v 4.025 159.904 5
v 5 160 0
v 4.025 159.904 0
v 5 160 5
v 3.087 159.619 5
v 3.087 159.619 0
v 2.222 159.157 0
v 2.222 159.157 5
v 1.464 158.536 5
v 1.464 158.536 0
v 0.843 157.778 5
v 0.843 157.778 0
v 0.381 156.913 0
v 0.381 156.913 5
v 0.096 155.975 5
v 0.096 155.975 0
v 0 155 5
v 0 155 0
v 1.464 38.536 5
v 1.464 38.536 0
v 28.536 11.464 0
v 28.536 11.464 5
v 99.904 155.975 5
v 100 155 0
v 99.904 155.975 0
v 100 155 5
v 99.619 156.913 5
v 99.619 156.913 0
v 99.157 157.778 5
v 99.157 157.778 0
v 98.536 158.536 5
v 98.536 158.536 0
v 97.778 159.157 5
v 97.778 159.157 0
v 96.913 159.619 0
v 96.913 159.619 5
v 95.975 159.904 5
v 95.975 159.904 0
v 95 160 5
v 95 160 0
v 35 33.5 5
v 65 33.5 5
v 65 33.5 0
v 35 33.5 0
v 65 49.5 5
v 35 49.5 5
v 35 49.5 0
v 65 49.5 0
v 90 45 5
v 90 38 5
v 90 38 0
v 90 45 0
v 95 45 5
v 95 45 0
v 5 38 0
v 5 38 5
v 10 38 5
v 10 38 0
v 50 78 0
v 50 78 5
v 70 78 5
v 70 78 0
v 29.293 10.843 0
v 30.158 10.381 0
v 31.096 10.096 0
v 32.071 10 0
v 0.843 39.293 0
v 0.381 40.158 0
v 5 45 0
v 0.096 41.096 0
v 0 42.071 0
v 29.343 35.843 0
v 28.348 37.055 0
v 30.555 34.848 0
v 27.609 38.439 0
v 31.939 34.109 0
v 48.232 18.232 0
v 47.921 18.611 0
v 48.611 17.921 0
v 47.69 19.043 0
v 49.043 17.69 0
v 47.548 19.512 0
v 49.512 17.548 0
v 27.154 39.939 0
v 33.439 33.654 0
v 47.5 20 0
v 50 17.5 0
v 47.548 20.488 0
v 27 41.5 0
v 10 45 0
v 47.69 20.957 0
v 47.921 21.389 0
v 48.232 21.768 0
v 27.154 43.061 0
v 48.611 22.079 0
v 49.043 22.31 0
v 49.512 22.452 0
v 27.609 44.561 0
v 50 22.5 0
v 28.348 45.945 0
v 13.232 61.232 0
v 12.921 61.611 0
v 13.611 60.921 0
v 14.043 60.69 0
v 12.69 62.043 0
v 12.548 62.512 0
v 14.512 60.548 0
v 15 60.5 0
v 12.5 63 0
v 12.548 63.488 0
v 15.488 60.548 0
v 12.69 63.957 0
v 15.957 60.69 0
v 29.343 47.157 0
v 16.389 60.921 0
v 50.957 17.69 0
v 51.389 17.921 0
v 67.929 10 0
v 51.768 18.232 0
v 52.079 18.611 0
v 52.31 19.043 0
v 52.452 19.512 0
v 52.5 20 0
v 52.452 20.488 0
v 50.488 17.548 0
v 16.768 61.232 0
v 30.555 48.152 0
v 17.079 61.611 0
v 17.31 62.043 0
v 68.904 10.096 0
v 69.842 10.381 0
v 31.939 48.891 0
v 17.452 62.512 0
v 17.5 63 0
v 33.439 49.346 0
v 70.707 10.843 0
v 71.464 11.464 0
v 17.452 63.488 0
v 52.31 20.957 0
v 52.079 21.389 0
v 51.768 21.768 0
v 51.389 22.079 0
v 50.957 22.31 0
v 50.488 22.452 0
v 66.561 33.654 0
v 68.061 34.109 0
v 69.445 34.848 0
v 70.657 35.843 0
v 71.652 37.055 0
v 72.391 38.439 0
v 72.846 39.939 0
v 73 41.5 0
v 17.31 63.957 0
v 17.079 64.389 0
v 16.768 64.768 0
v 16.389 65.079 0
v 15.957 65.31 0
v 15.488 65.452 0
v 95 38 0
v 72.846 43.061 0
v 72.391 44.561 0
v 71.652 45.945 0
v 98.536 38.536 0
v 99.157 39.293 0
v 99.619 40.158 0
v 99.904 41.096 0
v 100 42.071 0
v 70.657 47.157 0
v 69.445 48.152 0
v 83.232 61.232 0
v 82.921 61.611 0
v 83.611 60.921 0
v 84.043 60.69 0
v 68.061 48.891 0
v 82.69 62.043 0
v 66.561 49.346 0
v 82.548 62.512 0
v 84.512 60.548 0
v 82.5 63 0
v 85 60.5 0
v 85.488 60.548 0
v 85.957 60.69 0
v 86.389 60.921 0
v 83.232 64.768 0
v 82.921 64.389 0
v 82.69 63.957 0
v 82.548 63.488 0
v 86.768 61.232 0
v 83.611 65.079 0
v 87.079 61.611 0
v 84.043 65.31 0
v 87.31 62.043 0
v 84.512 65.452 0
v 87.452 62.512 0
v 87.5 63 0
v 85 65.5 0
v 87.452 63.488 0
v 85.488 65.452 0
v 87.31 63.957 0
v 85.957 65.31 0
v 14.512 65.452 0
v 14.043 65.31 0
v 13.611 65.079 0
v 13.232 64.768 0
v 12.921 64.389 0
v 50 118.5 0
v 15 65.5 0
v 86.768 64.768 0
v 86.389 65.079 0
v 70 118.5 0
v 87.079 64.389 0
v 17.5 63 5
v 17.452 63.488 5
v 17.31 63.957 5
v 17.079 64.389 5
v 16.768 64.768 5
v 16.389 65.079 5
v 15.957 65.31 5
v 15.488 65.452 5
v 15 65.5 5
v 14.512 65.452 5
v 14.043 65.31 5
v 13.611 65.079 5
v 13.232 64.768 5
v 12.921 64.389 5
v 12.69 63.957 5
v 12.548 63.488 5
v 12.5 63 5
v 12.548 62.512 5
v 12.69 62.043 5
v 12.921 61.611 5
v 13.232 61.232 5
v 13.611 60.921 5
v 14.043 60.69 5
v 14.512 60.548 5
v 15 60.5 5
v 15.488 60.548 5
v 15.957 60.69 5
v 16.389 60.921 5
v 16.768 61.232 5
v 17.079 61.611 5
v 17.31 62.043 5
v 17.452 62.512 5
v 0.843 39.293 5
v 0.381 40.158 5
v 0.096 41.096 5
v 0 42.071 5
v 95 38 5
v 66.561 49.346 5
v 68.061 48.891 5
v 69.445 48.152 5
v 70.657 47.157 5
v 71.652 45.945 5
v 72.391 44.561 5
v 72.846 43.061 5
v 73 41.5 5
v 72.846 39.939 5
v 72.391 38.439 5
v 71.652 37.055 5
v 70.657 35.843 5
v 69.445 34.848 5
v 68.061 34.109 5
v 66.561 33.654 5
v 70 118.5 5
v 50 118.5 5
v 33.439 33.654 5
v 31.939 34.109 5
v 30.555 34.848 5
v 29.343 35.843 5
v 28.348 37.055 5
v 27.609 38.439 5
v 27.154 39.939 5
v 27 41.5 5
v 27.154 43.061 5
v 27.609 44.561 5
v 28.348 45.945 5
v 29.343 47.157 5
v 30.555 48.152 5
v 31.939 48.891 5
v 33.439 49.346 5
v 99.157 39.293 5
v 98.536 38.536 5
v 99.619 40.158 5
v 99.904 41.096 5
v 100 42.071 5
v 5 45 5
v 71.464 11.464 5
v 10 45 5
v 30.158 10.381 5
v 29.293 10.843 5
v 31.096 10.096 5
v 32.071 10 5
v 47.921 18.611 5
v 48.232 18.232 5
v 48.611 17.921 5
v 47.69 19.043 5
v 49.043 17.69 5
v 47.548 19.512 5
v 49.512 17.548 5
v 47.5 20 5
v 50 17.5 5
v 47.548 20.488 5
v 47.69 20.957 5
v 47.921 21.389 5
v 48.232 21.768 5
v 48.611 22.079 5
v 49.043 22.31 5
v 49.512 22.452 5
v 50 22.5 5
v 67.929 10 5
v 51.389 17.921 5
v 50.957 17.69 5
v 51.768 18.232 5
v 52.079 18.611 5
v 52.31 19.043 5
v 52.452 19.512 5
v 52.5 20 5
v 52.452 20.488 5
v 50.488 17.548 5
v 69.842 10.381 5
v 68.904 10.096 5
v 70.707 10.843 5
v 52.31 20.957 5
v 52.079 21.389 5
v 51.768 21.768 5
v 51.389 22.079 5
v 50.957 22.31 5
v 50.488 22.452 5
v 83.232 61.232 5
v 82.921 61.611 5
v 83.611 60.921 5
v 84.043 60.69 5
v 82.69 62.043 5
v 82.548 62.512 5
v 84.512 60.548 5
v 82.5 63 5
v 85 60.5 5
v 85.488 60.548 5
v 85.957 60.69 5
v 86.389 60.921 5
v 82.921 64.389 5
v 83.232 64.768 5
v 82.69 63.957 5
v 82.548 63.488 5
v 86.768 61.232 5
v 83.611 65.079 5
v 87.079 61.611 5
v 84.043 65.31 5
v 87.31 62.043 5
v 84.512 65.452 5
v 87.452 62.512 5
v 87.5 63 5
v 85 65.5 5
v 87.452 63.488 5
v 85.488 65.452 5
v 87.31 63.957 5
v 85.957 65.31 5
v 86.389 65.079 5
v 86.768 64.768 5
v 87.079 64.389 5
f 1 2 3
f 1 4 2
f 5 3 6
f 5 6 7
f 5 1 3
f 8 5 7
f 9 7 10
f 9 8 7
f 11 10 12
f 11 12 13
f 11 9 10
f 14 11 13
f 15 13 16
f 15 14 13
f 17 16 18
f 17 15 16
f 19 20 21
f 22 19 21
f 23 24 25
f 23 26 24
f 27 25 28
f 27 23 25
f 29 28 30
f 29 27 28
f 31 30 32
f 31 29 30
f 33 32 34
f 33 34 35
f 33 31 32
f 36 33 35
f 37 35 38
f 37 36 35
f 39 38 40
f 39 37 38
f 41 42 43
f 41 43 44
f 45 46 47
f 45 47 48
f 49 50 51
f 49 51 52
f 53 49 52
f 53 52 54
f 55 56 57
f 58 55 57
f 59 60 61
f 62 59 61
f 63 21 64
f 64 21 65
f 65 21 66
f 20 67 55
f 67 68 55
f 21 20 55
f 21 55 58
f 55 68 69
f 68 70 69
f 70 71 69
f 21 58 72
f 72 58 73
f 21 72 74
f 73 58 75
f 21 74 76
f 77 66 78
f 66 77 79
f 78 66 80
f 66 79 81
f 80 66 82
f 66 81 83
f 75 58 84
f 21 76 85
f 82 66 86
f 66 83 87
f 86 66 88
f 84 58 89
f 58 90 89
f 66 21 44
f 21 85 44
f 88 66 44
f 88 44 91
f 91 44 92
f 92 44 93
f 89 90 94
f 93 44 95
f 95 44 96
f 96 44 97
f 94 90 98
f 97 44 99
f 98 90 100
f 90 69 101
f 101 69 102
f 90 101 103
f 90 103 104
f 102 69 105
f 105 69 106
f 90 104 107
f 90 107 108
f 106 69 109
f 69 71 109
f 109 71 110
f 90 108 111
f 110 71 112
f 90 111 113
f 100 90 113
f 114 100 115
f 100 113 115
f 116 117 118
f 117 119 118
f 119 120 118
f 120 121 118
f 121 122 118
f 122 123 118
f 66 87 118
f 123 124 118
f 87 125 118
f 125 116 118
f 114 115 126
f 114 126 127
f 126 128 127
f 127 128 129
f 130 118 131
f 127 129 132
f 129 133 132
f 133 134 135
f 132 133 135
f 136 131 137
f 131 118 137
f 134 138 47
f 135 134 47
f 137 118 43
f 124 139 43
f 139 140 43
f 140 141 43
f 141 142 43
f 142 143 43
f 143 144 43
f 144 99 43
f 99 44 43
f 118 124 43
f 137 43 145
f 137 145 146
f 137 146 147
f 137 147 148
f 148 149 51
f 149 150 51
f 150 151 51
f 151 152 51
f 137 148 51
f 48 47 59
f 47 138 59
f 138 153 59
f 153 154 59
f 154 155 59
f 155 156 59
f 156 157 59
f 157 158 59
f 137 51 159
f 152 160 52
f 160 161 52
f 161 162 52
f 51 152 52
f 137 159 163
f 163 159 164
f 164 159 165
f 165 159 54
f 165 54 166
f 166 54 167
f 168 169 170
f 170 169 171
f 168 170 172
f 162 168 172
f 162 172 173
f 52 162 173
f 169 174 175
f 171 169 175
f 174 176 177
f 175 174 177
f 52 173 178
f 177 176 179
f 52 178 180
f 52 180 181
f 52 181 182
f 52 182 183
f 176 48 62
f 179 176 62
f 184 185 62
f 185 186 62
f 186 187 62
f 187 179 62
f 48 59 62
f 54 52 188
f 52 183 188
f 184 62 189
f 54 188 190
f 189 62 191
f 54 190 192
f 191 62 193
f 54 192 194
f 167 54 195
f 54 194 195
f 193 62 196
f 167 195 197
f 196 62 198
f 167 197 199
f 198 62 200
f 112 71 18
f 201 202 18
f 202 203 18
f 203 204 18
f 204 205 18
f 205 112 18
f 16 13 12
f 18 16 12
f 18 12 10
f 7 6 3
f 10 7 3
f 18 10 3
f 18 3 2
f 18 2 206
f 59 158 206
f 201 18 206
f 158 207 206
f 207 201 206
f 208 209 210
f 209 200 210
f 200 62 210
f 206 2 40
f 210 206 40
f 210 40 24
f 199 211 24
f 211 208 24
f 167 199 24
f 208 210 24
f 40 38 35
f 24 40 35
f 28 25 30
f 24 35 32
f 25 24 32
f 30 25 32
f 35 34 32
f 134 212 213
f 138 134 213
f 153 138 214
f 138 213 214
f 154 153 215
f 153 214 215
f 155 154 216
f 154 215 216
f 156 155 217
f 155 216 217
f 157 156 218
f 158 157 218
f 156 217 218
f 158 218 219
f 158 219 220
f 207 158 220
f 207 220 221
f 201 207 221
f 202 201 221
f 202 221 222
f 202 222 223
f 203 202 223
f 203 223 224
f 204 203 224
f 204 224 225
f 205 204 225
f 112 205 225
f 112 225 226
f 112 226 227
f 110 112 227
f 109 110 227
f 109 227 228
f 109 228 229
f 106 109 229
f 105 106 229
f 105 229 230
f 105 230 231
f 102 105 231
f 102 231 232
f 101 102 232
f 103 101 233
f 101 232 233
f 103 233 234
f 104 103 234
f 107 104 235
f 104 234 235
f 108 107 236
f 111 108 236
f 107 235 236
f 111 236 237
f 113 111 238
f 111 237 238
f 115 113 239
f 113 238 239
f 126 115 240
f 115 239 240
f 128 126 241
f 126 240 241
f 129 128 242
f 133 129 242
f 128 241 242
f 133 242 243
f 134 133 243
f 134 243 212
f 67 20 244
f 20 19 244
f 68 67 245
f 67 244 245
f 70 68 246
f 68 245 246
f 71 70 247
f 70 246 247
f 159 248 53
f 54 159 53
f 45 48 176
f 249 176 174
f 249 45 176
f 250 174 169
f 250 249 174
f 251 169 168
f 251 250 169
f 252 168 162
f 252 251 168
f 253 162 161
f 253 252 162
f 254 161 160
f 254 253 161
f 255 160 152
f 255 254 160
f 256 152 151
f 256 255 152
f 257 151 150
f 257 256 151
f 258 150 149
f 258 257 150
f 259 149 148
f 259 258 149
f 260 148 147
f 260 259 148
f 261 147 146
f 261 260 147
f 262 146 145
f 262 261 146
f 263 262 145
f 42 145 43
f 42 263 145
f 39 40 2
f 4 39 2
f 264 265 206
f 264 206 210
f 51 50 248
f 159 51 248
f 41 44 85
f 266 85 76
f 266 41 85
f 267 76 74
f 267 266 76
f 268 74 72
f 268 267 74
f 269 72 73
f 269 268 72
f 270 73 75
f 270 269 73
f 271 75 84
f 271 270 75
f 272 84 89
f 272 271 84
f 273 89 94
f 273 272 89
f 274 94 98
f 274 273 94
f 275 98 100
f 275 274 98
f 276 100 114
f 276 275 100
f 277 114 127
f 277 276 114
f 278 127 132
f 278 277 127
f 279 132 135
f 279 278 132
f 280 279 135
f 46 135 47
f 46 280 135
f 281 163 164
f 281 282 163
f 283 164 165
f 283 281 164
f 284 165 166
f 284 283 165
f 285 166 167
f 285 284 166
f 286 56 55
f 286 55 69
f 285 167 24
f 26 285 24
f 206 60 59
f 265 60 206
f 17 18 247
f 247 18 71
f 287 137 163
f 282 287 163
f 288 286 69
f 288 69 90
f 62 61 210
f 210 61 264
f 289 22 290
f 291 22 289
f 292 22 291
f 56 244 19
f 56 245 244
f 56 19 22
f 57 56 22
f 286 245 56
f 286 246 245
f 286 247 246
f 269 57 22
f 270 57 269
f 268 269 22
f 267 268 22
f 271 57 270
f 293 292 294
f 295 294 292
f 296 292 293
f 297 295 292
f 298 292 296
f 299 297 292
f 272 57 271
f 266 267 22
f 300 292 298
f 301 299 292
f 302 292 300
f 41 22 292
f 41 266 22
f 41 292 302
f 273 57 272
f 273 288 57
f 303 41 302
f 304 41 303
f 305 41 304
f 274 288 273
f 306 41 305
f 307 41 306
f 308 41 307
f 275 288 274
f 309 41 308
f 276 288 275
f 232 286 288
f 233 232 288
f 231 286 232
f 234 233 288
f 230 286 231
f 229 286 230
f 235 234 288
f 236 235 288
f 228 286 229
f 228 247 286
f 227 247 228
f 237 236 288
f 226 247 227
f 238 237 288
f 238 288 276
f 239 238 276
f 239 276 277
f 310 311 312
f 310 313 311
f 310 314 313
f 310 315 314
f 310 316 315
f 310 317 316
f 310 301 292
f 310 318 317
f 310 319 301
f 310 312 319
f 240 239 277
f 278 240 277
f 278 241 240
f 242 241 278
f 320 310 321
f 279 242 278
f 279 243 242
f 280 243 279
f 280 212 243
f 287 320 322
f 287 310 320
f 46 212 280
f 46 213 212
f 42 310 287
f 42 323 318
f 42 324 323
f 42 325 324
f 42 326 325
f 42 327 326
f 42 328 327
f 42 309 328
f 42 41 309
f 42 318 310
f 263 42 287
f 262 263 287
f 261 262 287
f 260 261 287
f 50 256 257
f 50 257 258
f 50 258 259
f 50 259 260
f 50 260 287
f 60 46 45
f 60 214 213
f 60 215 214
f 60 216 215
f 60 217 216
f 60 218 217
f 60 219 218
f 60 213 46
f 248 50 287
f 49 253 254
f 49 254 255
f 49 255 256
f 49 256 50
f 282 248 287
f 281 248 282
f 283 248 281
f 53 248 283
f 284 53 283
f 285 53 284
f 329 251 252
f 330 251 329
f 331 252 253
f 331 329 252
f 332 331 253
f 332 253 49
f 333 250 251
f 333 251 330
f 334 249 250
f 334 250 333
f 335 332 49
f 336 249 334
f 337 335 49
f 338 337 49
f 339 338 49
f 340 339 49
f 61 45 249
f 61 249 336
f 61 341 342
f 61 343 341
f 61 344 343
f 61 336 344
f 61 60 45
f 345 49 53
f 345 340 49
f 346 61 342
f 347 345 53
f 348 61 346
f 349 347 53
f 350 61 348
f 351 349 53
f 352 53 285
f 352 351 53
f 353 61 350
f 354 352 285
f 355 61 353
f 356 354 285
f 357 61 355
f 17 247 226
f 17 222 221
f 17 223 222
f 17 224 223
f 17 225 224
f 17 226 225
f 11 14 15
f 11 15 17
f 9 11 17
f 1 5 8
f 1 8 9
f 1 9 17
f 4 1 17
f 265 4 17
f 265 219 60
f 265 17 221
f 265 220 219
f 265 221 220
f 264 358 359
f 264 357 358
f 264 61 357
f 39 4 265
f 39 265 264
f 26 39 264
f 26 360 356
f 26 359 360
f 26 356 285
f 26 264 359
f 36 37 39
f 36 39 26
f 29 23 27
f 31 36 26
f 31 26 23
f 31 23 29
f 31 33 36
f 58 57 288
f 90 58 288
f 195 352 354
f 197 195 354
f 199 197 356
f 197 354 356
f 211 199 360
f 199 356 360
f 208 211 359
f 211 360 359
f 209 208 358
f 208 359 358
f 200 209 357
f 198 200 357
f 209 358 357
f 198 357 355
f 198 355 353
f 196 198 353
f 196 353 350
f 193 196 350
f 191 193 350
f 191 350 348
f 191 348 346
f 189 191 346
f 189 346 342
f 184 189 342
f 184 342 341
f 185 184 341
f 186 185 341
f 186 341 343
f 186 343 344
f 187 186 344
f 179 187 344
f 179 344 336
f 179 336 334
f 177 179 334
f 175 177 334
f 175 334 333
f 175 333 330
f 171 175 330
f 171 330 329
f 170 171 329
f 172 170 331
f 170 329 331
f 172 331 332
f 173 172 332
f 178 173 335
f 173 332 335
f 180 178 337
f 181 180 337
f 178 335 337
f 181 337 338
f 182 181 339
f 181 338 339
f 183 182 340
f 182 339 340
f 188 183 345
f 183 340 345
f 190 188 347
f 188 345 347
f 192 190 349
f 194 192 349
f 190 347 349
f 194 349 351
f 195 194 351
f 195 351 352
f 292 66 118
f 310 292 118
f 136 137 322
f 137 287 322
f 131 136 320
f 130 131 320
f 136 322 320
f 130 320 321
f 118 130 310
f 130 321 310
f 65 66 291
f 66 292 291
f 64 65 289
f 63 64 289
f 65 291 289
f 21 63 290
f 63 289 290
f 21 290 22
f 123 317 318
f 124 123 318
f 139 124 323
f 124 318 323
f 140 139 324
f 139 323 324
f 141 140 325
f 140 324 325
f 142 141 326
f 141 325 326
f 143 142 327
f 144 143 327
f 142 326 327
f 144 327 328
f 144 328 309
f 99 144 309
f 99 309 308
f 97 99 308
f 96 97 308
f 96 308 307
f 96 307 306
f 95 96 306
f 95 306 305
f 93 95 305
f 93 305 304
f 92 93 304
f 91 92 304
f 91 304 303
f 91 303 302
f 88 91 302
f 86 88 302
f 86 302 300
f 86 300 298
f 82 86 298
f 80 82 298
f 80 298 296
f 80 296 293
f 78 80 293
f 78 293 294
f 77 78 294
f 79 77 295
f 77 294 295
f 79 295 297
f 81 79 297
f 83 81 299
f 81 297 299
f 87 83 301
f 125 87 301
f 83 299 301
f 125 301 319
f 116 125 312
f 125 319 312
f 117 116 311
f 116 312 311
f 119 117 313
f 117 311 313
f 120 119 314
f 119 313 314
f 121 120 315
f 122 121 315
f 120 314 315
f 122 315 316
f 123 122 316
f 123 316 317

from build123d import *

# Parameters (mm, degrees)
BOSS_EXTRUDE1_DEPTH = 5
SKETCH3_R           = 2.5
SKETCH3_W           = 20
SKETCH3_H           = 40.5
CUT_EXTRUDE3_DEPTH  = 189.745860882
FILLET1_R           = 5
FILLET2_R           = 5
FILLET3_R           = 5
FILLET4_R           = 5
FILLET5_R           = 5
FILLET6_R           = 5
SKETCH4_W           = 5
SKETCH4_H           = 7
CUT_EXTRUDE6_DEPTH  = 189.745860882


with BuildPart() as part:
    # Sketch1 → Boss-Extrude1 (new body)
    with BuildSketch(Plane.XY):
        Polygon((0, 40), (30, 10), (70, 10), (100, 40), (100, 160), (0, 160), align=None)
    extrude(amount=BOSS_EXTRUDE1_DEPTH)

    # Sketch3 → Cut-Extrude3 (cut, through all)
    with BuildSketch(Plane.XY.offset(5)):
        with Locations((50, 20)):
            Circle(SKETCH3_R)
        with Locations((85, 63)):
            Circle(SKETCH3_R)
        with Locations((15, 63)):
            Circle(SKETCH3_R)
        with Locations((60, 98.25)):
            Rectangle(SKETCH3_W, SKETCH3_H)
        with BuildLine():
            Line((35, 49.5), (65, 49.5))
            ThreePointArc((65, 49.5), (73, 41.5), (65, 33.5))
            Line((65, 33.5), (35, 33.5))
            ThreePointArc((35, 33.5), (27, 41.5), (35, 49.5))
        make_face()
    extrude(amount=-CUT_EXTRUDE3_DEPTH, mode=Mode.SUBTRACT)

    # Fillet1
    fillet1_edges = [part.edges().sort_by_distance(p)[0] for p in [
        (0, 40, 2.5),
    ]]
    fillet(fillet1_edges, radius=FILLET1_R)

    # Fillet2
    fillet2_edges = [part.edges().sort_by_distance(p)[0] for p in [
        (100, 40, 2.5),
    ]]
    fillet(fillet2_edges, radius=FILLET2_R)

    # Fillet3
    fillet3_edges = [part.edges().sort_by_distance(p)[0] for p in [
        (70, 10, 2.5),
    ]]
    fillet(fillet3_edges, radius=FILLET3_R)

    # Fillet4
    fillet4_edges = [part.edges().sort_by_distance(p)[0] for p in [
        (30, 10, 2.5),
    ]]
    fillet(fillet4_edges, radius=FILLET4_R)

    # Fillet5
    fillet5_edges = [part.edges().sort_by_distance(p)[0] for p in [
        (100, 160, 2.5),
    ]]
    fillet(fillet5_edges, radius=FILLET5_R)

    # Fillet6
    fillet6_edges = [part.edges().sort_by_distance(p)[0] for p in [
        (0, 160, 2.5),
    ]]
    fillet(fillet6_edges, radius=FILLET6_R)

    # Sketch4 → Cut-Extrude6 (cut, through all)
    with BuildSketch(Plane.XY.offset(5)):
        with Locations((7.5, 41.5)):
            Rectangle(SKETCH4_W, SKETCH4_H)
        with Locations((92.5, 41.5)):
            Rectangle(SKETCH4_W, SKETCH4_H)
    extrude(amount=-CUT_EXTRUDE6_DEPTH, mode=Mode.SUBTRACT)


solid = part.part
